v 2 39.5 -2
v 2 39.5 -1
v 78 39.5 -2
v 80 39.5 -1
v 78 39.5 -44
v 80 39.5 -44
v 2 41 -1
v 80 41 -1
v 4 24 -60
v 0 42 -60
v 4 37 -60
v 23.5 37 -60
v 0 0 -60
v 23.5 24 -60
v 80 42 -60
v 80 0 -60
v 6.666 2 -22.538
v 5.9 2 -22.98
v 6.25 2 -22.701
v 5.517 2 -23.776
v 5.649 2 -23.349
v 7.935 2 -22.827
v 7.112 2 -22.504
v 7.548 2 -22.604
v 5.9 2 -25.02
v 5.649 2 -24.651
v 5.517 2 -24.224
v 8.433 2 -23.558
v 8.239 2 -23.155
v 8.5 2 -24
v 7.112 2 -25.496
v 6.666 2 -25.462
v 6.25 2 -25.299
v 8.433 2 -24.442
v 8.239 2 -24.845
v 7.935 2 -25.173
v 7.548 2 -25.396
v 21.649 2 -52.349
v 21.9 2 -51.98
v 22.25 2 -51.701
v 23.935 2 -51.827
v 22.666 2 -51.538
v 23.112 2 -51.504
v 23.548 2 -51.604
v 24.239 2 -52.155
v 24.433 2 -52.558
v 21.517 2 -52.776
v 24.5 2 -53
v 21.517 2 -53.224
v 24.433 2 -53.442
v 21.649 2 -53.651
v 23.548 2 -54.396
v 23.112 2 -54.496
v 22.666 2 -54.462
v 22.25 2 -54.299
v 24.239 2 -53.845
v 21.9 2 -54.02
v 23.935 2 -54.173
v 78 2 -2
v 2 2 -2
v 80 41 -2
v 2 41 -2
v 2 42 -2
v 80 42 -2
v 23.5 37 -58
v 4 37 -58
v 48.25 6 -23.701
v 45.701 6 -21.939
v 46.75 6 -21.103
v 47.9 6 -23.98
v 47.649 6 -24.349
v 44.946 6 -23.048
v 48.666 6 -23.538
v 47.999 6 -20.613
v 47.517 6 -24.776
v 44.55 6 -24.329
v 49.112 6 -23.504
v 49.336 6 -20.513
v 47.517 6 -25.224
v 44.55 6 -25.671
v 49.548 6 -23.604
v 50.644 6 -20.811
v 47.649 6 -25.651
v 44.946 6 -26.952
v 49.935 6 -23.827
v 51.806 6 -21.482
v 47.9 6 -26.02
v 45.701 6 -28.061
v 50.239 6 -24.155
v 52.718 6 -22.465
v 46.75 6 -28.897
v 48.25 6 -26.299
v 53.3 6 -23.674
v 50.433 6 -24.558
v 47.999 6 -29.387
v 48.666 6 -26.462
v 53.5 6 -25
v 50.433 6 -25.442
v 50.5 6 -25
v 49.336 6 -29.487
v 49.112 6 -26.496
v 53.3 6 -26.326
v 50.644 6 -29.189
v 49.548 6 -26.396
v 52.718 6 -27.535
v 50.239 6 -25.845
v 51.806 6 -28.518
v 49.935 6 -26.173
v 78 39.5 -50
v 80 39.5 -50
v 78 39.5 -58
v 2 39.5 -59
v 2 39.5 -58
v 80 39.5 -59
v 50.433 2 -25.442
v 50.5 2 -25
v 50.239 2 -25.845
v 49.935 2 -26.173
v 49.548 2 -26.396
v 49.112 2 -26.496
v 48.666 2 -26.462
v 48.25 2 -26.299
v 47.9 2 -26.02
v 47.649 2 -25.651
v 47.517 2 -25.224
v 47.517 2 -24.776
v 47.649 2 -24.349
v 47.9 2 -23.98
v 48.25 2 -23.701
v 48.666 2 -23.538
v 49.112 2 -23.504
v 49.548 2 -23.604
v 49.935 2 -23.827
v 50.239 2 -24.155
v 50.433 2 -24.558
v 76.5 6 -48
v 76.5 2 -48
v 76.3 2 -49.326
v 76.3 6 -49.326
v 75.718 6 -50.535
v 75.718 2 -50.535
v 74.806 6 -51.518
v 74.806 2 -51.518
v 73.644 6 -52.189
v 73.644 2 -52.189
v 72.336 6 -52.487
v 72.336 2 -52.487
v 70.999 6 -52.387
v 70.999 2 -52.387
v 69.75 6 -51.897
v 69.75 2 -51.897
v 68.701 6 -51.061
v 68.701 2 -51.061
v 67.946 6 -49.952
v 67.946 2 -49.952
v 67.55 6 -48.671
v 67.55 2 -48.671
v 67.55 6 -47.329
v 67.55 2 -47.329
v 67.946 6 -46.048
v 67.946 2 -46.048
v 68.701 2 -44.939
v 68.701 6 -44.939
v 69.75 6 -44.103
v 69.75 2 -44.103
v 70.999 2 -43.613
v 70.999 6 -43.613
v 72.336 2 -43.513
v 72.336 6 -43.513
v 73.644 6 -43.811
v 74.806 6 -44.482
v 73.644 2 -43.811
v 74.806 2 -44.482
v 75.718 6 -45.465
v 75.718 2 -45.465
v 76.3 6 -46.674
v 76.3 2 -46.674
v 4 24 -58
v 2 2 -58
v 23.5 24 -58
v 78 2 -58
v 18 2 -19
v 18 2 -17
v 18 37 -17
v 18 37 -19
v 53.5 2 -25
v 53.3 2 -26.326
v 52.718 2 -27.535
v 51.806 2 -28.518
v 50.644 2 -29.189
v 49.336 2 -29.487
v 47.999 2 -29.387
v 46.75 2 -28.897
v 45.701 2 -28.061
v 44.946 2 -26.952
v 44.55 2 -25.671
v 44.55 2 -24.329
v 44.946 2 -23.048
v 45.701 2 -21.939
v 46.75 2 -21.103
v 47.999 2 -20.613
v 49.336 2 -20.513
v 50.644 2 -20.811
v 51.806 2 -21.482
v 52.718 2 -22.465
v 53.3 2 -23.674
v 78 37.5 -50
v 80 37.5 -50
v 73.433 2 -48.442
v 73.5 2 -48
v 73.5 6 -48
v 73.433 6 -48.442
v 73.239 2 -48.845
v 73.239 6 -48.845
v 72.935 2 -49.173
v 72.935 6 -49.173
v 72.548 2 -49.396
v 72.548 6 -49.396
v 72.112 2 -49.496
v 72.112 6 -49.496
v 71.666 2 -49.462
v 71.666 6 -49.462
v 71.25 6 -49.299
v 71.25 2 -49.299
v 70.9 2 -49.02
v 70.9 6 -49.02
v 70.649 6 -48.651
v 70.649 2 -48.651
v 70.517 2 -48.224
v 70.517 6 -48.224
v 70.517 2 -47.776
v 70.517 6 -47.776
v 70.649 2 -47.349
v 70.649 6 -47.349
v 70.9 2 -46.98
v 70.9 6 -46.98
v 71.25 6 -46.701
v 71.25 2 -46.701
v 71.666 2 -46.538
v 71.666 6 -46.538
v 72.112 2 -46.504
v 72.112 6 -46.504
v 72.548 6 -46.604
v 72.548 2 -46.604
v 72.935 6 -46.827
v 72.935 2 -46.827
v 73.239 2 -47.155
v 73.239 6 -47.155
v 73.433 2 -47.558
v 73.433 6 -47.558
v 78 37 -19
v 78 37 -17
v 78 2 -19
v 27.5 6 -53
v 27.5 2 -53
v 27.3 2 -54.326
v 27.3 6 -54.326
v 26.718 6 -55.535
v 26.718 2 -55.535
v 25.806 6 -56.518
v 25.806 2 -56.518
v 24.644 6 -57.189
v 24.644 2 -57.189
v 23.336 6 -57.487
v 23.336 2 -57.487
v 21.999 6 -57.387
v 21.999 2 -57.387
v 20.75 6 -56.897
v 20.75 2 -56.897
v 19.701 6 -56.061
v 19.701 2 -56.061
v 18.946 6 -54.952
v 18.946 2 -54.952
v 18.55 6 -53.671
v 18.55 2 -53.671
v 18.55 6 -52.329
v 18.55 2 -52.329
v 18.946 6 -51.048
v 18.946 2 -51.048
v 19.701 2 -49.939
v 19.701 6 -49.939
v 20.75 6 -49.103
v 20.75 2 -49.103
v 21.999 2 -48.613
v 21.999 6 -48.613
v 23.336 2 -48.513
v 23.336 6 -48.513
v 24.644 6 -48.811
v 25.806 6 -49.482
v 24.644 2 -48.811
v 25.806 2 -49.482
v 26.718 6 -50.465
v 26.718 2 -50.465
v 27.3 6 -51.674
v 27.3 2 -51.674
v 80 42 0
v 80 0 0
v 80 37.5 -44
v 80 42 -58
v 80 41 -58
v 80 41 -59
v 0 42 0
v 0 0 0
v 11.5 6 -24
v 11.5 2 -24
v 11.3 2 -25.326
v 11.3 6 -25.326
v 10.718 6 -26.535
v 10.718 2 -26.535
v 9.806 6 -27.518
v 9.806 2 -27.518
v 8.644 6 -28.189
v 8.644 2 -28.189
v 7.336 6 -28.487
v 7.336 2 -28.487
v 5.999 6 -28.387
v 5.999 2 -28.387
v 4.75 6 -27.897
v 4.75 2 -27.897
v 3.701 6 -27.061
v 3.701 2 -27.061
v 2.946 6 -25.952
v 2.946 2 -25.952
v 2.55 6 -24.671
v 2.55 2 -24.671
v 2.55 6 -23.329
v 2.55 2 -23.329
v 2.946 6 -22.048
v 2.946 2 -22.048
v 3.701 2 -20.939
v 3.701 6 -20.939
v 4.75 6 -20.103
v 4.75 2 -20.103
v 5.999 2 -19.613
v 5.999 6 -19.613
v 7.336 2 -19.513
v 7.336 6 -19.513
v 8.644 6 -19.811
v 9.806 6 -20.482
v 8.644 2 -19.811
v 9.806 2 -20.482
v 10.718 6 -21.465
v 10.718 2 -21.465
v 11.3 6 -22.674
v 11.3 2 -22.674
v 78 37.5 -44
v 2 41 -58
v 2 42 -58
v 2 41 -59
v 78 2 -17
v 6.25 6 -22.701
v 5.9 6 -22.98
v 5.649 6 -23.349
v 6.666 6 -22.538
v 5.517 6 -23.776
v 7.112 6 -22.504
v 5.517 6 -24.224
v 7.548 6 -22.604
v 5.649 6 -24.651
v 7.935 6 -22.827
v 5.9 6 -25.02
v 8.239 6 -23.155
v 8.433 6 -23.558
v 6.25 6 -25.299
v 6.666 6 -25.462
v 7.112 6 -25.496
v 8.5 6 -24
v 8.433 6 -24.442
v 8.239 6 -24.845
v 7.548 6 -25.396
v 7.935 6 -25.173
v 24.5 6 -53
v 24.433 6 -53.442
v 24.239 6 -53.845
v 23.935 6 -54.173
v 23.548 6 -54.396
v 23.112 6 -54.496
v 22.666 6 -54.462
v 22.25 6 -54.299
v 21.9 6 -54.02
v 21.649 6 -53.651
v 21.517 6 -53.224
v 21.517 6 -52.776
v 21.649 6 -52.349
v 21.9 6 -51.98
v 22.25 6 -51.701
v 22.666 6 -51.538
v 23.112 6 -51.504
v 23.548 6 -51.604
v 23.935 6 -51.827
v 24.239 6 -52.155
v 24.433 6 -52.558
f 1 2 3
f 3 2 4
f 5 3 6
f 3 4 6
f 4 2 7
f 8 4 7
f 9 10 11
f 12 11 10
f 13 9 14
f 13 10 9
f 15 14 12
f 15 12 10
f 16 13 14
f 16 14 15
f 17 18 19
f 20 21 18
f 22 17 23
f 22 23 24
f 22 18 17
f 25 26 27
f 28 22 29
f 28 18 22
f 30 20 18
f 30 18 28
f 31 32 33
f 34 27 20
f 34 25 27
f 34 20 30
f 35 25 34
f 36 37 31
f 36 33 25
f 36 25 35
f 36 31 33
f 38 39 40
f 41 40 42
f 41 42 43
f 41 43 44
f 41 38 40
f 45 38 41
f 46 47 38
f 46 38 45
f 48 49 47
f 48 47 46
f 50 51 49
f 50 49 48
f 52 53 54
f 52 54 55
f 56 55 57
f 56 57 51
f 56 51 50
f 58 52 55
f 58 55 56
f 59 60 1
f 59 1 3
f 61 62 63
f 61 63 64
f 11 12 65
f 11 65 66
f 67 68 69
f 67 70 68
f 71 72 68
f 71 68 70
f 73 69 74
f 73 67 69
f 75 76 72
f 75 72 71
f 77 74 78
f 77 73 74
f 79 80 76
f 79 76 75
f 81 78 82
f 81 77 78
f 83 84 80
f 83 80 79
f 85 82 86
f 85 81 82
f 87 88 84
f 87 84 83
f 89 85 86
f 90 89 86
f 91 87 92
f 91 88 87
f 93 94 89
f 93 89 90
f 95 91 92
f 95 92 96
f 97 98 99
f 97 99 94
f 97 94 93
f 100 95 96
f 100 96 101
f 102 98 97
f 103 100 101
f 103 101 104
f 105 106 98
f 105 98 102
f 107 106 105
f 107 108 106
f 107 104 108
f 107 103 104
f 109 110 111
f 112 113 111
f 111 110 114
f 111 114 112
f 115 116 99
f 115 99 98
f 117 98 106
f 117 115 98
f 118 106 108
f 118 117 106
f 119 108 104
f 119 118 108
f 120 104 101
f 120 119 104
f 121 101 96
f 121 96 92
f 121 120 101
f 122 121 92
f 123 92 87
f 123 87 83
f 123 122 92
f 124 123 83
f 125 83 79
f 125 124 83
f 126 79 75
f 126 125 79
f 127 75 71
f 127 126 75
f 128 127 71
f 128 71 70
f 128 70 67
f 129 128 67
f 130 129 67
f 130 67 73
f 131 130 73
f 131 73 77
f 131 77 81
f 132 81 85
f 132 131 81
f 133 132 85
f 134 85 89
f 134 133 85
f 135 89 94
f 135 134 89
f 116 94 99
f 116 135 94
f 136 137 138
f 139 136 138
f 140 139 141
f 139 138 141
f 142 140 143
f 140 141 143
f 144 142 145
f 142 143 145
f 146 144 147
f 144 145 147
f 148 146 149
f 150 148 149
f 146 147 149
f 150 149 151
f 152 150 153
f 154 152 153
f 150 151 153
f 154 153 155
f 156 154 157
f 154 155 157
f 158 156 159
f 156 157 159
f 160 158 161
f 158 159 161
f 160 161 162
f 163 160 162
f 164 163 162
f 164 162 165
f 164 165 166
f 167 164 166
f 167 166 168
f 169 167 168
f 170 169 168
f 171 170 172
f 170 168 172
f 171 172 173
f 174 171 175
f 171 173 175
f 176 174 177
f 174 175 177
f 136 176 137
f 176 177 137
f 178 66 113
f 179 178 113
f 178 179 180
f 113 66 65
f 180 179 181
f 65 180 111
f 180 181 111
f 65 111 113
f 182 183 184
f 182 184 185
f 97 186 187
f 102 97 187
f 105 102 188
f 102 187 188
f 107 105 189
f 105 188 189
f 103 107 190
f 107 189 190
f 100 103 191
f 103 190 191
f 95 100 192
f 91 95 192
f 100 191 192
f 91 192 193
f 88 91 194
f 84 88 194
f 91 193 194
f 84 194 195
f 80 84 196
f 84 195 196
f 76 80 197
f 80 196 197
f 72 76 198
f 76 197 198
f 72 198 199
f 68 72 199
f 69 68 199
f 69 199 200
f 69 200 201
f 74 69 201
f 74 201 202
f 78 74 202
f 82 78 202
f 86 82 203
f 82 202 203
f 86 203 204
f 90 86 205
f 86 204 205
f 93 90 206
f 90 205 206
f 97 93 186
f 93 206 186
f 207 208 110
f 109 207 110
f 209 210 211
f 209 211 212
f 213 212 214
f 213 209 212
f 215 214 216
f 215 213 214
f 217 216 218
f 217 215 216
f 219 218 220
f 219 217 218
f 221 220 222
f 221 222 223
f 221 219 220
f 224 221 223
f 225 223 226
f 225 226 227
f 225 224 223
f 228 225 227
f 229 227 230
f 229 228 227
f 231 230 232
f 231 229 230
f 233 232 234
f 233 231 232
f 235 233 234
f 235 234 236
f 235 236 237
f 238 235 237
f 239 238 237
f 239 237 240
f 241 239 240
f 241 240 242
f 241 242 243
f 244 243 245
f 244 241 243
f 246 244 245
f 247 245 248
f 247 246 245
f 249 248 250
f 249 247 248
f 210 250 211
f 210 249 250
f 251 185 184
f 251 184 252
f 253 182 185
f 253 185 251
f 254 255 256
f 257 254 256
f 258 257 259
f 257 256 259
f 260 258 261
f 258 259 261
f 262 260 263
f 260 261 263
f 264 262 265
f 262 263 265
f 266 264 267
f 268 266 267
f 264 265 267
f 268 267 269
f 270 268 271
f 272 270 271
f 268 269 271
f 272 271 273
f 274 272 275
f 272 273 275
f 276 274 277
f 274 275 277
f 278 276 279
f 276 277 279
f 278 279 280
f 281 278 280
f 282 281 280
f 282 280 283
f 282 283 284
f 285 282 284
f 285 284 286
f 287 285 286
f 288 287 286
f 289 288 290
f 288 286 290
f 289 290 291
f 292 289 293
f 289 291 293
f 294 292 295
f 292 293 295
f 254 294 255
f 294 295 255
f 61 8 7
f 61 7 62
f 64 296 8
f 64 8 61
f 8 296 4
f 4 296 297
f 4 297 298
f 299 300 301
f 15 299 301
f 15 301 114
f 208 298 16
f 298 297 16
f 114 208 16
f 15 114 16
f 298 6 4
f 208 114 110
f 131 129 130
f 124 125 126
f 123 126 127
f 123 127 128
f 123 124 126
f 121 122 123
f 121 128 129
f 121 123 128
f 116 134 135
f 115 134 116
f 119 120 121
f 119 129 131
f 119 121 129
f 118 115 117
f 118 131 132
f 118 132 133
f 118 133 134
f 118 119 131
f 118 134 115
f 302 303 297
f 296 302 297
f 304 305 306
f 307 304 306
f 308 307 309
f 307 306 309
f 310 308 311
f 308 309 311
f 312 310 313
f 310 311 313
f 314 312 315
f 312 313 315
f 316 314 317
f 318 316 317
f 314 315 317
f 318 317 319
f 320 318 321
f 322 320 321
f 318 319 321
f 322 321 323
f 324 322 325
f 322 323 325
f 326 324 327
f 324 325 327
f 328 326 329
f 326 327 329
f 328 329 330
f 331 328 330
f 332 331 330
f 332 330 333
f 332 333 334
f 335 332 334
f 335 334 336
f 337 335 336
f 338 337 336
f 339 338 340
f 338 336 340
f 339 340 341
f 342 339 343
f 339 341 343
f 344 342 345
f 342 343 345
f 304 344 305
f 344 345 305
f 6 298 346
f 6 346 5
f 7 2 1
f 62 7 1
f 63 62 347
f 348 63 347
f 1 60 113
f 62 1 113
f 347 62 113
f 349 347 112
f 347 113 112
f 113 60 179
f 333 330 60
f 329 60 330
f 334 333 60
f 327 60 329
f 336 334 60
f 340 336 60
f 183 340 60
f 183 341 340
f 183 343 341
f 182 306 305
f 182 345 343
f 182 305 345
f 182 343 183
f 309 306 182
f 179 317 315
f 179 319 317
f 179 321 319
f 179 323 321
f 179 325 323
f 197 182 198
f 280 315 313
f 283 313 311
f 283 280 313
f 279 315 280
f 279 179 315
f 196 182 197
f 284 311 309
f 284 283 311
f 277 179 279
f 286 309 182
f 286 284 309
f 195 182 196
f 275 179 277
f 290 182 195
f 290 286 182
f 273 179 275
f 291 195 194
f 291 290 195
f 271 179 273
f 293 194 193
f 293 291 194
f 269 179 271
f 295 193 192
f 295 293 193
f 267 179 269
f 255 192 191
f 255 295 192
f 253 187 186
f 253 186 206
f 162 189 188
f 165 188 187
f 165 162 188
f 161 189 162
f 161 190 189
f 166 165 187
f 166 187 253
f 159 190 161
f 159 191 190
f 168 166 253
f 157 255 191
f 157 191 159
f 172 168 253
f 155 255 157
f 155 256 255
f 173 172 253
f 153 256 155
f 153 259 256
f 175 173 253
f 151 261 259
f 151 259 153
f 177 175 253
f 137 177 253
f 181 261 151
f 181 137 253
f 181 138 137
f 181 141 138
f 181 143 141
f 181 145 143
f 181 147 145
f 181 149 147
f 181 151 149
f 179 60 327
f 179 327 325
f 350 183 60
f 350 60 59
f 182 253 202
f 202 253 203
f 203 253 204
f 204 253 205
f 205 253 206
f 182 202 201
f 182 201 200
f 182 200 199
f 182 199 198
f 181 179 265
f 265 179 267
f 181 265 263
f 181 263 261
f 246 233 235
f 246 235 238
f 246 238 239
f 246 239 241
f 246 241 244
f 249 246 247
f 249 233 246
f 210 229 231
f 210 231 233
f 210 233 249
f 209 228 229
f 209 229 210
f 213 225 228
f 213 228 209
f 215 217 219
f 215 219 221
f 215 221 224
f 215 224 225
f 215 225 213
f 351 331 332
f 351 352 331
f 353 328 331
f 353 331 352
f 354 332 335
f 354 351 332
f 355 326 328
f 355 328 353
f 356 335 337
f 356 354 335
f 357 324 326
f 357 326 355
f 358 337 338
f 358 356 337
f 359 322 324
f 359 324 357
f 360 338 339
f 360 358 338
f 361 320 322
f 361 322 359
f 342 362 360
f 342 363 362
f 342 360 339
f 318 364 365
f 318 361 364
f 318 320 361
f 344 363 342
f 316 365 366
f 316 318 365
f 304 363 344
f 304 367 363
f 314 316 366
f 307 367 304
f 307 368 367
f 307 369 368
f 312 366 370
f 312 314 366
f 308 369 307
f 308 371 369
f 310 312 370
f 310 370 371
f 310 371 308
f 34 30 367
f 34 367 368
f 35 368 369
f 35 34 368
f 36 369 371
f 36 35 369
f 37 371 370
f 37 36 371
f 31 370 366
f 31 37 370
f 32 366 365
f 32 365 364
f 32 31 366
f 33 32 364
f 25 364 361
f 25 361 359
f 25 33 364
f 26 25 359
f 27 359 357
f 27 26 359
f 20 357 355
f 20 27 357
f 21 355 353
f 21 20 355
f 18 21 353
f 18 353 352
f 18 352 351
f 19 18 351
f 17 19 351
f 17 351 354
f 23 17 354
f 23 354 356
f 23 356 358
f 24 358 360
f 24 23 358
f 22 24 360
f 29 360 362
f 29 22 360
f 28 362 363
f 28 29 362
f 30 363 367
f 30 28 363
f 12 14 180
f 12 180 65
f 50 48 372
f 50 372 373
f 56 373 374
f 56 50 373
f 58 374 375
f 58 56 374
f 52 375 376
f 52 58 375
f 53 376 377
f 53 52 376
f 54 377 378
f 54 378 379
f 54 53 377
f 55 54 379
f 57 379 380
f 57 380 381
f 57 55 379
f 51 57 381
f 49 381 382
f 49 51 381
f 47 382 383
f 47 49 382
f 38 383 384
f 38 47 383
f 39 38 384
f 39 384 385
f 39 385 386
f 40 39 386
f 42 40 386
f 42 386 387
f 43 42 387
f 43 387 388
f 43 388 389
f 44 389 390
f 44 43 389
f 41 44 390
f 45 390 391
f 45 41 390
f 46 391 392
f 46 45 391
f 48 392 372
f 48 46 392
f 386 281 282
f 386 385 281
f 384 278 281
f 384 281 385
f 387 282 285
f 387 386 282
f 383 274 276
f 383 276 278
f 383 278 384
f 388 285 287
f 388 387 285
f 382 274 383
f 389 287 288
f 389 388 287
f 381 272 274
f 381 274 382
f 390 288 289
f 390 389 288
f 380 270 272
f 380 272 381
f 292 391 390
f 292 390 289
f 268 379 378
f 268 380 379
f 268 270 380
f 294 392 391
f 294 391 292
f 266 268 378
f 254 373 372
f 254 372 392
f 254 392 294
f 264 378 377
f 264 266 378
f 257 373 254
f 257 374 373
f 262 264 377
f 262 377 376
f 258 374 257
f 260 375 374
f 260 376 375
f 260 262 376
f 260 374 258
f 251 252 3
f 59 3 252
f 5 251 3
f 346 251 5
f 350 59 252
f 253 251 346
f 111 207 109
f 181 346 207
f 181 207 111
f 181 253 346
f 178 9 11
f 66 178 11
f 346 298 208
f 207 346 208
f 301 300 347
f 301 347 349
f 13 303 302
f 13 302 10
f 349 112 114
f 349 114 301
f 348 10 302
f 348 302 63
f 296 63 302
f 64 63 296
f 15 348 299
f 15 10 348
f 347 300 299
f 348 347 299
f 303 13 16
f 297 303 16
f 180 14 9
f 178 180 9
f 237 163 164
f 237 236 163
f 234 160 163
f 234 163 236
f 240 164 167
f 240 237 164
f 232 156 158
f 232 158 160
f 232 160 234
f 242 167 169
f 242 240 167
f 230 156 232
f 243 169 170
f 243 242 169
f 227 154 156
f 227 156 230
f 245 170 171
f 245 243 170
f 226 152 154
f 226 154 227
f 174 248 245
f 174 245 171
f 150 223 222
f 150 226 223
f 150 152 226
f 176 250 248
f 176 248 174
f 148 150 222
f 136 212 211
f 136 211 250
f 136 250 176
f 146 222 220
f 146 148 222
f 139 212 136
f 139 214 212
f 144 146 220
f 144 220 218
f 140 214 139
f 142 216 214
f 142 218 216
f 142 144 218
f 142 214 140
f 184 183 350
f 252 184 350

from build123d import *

# Parameters (mm, degrees)
SKIZZE1_W                       = 80
SKIZZE1_H                       = 60
AUFSATZ_LINEAR_AUSTRAGEN1_DEPTH = 42
WANDUNG1_T                      = -2
SKIZZE2_W                       = 60
SKIZZE2_H                       = 2
AUFSATZ_LINEAR_AUSTRAGEN2_DEPTH = 35
SKIZZE3_R                       = 4.5
SKIZZE3_R_2                     = 1.5
AUFSATZ_LINEAR_AUSTRAGEN3_DEPTH = 4
SKIZZE4_R                       = 4.5
SKIZZE4_R_2                     = 1.5
AUFSATZ_LINEAR_AUSTRAGEN4_DEPTH = 4
SCHNITT_LINEAR_AUSTRAGEN1_REACH = 82
SKIZZE6_W                       = 56
SKIZZE6_H                       = 2
SKIZZE7_W                       = 58
SKIZZE7_H                       = 1.5
SCHNITT_LINEAR_AUSTRAGEN2_DEPTH = 78
SCHNITT_LINEAR_AUSTRAGEN3_REACH = 82
SKIZZE8_W                       = 6
SKIZZE8_H                       = 2
SCHNITT_LINEAR_AUSTRAGEN5_REACH = 62
SKIZZE9_W                       = 19.5
SKIZZE9_H                       = 13


with BuildPart() as part:
    # Skizze1 → Aufsatz-Linear austragen1 (new body)
    with BuildSketch(Plane(origin=(0, 0, 0), x_dir=(1, 0, 0), z_dir=(0, 1, 0))):
        with Locations((40, 30)):
            Rectangle(SKIZZE1_W, SKIZZE1_H)
    extrude(amount=AUFSATZ_LINEAR_AUSTRAGEN1_DEPTH)

    # Wandung1
    wandung1_openings = [part.faces().sort_by_distance(p)[0] for p in [
        (40, 42, -30),
    ]]
    offset(amount=WANDUNG1_T, openings=wandung1_openings, kind=Kind.INTERSECTION)

    # Skizze2 → Aufsatz-Linear austragen2 (add)
    with BuildSketch(Plane(origin=(0, 2, 0), x_dir=(1, 0, 0), z_dir=(0, 1, 0))):
        with Locations((48, 18)):
            Rectangle(SKIZZE2_W, SKIZZE2_H)
    extrude(amount=AUFSATZ_LINEAR_AUSTRAGEN2_DEPTH)

    # Skizze3 → Aufsatz-Linear austragen3 (add)
    with BuildSketch(Plane(origin=(0, 2, 0), x_dir=(1, 0, 0), z_dir=(0, 1, 0))):
        with Locations((7, 24)):
            Circle(SKIZZE3_R)
        with Locations((7, 24)):
            Circle(SKIZZE3_R_2, mode=Mode.SUBTRACT)
        with Locations((23, 53)):
            Circle(SKIZZE3_R)
        with Locations((23, 53)):
            Circle(SKIZZE3_R_2, mode=Mode.SUBTRACT)
    extrude(amount=AUFSATZ_LINEAR_AUSTRAGEN3_DEPTH)

    # Skizze4 → Aufsatz-Linear austragen4 (add)
    with BuildSketch(Plane(origin=(0, 2, 0), x_dir=(1, 0, 0), z_dir=(0, 1, 0))):
        with Locations((49, 25)):
            Circle(SKIZZE4_R)
        with Locations((49, 25)):
            Circle(SKIZZE4_R_2, mode=Mode.SUBTRACT)
        with Locations((72, 48)):
            Circle(SKIZZE4_R)
        with Locations((72, 48)):
            Circle(SKIZZE4_R_2, mode=Mode.SUBTRACT)
    extrude(amount=AUFSATZ_LINEAR_AUSTRAGEN4_DEPTH)

    # Skizze6 → Schnitt-Linear austragen1 (cut, up to next)
    with BuildSketch(Plane(origin=(80, 0, 0), x_dir=(0, 0, -1), z_dir=(1, 0, 0)), mode=Mode.PRIVATE) as schnitt_linear_austragen1_sk1:
        with Locations((30, 41)):
            Rectangle(SKIZZE6_W, SKIZZE6_H)
    schnitt_linear_austragen1_tool1 = extrude(schnitt_linear_austragen1_sk1.sketch, amount=-SCHNITT_LINEAR_AUSTRAGEN1_REACH, mode=Mode.PRIVATE) & part.part
    add(schnitt_linear_austragen1_tool1.solids().sort_by_distance((80, 41, -30))[0], mode=Mode.SUBTRACT)

    # Skizze7 → Schnitt-Linear austragen2 (cut)
    with BuildSketch(Plane(origin=(80, 0, 0), x_dir=(0, 0, -1), z_dir=(1, 0, 0))):
        with Locations((30, 40.25)):
            Rectangle(SKIZZE7_W, SKIZZE7_H)
    extrude(amount=-SCHNITT_LINEAR_AUSTRAGEN2_DEPTH, mode=Mode.SUBTRACT)

    # Skizze8 → Schnitt-Linear austragen3 (cut, up to next)
    with BuildSketch(Plane(origin=(80, 0, 0), x_dir=(0, 0, -1), z_dir=(1, 0, 0)), mode=Mode.PRIVATE) as schnitt_linear_austragen3_sk1:
        with Locations((47, 38.5)):
            Rectangle(SKIZZE8_W, SKIZZE8_H)
    schnitt_linear_austragen3_tool1 = extrude(schnitt_linear_austragen3_sk1.sketch, amount=-SCHNITT_LINEAR_AUSTRAGEN3_REACH, mode=Mode.PRIVATE) & part.part
    add(schnitt_linear_austragen3_tool1.solids().sort_by_distance((80, 38.5, -47))[0], mode=Mode.SUBTRACT)

    # Skizze9 → Schnitt-Linear austragen5 (cut, up to next)
    with BuildSketch(Plane(origin=(0, 0, -60), x_dir=(-1, 0, 0), z_dir=(0, 0, -1)), mode=Mode.PRIVATE) as schnitt_linear_austragen5_sk1:
        with Locations((-13.75, 30.5)):
            Rectangle(SKIZZE9_W, SKIZZE9_H)
    schnitt_linear_austragen5_tool1 = extrude(schnitt_linear_austragen5_sk1.sketch, amount=-SCHNITT_LINEAR_AUSTRAGEN5_REACH, mode=Mode.PRIVATE) & part.part
    add(schnitt_linear_austragen5_tool1.solids().sort_by_distance((13.75, 30.5, -60))[0], mode=Mode.SUBTRACT)


solid = part.part
